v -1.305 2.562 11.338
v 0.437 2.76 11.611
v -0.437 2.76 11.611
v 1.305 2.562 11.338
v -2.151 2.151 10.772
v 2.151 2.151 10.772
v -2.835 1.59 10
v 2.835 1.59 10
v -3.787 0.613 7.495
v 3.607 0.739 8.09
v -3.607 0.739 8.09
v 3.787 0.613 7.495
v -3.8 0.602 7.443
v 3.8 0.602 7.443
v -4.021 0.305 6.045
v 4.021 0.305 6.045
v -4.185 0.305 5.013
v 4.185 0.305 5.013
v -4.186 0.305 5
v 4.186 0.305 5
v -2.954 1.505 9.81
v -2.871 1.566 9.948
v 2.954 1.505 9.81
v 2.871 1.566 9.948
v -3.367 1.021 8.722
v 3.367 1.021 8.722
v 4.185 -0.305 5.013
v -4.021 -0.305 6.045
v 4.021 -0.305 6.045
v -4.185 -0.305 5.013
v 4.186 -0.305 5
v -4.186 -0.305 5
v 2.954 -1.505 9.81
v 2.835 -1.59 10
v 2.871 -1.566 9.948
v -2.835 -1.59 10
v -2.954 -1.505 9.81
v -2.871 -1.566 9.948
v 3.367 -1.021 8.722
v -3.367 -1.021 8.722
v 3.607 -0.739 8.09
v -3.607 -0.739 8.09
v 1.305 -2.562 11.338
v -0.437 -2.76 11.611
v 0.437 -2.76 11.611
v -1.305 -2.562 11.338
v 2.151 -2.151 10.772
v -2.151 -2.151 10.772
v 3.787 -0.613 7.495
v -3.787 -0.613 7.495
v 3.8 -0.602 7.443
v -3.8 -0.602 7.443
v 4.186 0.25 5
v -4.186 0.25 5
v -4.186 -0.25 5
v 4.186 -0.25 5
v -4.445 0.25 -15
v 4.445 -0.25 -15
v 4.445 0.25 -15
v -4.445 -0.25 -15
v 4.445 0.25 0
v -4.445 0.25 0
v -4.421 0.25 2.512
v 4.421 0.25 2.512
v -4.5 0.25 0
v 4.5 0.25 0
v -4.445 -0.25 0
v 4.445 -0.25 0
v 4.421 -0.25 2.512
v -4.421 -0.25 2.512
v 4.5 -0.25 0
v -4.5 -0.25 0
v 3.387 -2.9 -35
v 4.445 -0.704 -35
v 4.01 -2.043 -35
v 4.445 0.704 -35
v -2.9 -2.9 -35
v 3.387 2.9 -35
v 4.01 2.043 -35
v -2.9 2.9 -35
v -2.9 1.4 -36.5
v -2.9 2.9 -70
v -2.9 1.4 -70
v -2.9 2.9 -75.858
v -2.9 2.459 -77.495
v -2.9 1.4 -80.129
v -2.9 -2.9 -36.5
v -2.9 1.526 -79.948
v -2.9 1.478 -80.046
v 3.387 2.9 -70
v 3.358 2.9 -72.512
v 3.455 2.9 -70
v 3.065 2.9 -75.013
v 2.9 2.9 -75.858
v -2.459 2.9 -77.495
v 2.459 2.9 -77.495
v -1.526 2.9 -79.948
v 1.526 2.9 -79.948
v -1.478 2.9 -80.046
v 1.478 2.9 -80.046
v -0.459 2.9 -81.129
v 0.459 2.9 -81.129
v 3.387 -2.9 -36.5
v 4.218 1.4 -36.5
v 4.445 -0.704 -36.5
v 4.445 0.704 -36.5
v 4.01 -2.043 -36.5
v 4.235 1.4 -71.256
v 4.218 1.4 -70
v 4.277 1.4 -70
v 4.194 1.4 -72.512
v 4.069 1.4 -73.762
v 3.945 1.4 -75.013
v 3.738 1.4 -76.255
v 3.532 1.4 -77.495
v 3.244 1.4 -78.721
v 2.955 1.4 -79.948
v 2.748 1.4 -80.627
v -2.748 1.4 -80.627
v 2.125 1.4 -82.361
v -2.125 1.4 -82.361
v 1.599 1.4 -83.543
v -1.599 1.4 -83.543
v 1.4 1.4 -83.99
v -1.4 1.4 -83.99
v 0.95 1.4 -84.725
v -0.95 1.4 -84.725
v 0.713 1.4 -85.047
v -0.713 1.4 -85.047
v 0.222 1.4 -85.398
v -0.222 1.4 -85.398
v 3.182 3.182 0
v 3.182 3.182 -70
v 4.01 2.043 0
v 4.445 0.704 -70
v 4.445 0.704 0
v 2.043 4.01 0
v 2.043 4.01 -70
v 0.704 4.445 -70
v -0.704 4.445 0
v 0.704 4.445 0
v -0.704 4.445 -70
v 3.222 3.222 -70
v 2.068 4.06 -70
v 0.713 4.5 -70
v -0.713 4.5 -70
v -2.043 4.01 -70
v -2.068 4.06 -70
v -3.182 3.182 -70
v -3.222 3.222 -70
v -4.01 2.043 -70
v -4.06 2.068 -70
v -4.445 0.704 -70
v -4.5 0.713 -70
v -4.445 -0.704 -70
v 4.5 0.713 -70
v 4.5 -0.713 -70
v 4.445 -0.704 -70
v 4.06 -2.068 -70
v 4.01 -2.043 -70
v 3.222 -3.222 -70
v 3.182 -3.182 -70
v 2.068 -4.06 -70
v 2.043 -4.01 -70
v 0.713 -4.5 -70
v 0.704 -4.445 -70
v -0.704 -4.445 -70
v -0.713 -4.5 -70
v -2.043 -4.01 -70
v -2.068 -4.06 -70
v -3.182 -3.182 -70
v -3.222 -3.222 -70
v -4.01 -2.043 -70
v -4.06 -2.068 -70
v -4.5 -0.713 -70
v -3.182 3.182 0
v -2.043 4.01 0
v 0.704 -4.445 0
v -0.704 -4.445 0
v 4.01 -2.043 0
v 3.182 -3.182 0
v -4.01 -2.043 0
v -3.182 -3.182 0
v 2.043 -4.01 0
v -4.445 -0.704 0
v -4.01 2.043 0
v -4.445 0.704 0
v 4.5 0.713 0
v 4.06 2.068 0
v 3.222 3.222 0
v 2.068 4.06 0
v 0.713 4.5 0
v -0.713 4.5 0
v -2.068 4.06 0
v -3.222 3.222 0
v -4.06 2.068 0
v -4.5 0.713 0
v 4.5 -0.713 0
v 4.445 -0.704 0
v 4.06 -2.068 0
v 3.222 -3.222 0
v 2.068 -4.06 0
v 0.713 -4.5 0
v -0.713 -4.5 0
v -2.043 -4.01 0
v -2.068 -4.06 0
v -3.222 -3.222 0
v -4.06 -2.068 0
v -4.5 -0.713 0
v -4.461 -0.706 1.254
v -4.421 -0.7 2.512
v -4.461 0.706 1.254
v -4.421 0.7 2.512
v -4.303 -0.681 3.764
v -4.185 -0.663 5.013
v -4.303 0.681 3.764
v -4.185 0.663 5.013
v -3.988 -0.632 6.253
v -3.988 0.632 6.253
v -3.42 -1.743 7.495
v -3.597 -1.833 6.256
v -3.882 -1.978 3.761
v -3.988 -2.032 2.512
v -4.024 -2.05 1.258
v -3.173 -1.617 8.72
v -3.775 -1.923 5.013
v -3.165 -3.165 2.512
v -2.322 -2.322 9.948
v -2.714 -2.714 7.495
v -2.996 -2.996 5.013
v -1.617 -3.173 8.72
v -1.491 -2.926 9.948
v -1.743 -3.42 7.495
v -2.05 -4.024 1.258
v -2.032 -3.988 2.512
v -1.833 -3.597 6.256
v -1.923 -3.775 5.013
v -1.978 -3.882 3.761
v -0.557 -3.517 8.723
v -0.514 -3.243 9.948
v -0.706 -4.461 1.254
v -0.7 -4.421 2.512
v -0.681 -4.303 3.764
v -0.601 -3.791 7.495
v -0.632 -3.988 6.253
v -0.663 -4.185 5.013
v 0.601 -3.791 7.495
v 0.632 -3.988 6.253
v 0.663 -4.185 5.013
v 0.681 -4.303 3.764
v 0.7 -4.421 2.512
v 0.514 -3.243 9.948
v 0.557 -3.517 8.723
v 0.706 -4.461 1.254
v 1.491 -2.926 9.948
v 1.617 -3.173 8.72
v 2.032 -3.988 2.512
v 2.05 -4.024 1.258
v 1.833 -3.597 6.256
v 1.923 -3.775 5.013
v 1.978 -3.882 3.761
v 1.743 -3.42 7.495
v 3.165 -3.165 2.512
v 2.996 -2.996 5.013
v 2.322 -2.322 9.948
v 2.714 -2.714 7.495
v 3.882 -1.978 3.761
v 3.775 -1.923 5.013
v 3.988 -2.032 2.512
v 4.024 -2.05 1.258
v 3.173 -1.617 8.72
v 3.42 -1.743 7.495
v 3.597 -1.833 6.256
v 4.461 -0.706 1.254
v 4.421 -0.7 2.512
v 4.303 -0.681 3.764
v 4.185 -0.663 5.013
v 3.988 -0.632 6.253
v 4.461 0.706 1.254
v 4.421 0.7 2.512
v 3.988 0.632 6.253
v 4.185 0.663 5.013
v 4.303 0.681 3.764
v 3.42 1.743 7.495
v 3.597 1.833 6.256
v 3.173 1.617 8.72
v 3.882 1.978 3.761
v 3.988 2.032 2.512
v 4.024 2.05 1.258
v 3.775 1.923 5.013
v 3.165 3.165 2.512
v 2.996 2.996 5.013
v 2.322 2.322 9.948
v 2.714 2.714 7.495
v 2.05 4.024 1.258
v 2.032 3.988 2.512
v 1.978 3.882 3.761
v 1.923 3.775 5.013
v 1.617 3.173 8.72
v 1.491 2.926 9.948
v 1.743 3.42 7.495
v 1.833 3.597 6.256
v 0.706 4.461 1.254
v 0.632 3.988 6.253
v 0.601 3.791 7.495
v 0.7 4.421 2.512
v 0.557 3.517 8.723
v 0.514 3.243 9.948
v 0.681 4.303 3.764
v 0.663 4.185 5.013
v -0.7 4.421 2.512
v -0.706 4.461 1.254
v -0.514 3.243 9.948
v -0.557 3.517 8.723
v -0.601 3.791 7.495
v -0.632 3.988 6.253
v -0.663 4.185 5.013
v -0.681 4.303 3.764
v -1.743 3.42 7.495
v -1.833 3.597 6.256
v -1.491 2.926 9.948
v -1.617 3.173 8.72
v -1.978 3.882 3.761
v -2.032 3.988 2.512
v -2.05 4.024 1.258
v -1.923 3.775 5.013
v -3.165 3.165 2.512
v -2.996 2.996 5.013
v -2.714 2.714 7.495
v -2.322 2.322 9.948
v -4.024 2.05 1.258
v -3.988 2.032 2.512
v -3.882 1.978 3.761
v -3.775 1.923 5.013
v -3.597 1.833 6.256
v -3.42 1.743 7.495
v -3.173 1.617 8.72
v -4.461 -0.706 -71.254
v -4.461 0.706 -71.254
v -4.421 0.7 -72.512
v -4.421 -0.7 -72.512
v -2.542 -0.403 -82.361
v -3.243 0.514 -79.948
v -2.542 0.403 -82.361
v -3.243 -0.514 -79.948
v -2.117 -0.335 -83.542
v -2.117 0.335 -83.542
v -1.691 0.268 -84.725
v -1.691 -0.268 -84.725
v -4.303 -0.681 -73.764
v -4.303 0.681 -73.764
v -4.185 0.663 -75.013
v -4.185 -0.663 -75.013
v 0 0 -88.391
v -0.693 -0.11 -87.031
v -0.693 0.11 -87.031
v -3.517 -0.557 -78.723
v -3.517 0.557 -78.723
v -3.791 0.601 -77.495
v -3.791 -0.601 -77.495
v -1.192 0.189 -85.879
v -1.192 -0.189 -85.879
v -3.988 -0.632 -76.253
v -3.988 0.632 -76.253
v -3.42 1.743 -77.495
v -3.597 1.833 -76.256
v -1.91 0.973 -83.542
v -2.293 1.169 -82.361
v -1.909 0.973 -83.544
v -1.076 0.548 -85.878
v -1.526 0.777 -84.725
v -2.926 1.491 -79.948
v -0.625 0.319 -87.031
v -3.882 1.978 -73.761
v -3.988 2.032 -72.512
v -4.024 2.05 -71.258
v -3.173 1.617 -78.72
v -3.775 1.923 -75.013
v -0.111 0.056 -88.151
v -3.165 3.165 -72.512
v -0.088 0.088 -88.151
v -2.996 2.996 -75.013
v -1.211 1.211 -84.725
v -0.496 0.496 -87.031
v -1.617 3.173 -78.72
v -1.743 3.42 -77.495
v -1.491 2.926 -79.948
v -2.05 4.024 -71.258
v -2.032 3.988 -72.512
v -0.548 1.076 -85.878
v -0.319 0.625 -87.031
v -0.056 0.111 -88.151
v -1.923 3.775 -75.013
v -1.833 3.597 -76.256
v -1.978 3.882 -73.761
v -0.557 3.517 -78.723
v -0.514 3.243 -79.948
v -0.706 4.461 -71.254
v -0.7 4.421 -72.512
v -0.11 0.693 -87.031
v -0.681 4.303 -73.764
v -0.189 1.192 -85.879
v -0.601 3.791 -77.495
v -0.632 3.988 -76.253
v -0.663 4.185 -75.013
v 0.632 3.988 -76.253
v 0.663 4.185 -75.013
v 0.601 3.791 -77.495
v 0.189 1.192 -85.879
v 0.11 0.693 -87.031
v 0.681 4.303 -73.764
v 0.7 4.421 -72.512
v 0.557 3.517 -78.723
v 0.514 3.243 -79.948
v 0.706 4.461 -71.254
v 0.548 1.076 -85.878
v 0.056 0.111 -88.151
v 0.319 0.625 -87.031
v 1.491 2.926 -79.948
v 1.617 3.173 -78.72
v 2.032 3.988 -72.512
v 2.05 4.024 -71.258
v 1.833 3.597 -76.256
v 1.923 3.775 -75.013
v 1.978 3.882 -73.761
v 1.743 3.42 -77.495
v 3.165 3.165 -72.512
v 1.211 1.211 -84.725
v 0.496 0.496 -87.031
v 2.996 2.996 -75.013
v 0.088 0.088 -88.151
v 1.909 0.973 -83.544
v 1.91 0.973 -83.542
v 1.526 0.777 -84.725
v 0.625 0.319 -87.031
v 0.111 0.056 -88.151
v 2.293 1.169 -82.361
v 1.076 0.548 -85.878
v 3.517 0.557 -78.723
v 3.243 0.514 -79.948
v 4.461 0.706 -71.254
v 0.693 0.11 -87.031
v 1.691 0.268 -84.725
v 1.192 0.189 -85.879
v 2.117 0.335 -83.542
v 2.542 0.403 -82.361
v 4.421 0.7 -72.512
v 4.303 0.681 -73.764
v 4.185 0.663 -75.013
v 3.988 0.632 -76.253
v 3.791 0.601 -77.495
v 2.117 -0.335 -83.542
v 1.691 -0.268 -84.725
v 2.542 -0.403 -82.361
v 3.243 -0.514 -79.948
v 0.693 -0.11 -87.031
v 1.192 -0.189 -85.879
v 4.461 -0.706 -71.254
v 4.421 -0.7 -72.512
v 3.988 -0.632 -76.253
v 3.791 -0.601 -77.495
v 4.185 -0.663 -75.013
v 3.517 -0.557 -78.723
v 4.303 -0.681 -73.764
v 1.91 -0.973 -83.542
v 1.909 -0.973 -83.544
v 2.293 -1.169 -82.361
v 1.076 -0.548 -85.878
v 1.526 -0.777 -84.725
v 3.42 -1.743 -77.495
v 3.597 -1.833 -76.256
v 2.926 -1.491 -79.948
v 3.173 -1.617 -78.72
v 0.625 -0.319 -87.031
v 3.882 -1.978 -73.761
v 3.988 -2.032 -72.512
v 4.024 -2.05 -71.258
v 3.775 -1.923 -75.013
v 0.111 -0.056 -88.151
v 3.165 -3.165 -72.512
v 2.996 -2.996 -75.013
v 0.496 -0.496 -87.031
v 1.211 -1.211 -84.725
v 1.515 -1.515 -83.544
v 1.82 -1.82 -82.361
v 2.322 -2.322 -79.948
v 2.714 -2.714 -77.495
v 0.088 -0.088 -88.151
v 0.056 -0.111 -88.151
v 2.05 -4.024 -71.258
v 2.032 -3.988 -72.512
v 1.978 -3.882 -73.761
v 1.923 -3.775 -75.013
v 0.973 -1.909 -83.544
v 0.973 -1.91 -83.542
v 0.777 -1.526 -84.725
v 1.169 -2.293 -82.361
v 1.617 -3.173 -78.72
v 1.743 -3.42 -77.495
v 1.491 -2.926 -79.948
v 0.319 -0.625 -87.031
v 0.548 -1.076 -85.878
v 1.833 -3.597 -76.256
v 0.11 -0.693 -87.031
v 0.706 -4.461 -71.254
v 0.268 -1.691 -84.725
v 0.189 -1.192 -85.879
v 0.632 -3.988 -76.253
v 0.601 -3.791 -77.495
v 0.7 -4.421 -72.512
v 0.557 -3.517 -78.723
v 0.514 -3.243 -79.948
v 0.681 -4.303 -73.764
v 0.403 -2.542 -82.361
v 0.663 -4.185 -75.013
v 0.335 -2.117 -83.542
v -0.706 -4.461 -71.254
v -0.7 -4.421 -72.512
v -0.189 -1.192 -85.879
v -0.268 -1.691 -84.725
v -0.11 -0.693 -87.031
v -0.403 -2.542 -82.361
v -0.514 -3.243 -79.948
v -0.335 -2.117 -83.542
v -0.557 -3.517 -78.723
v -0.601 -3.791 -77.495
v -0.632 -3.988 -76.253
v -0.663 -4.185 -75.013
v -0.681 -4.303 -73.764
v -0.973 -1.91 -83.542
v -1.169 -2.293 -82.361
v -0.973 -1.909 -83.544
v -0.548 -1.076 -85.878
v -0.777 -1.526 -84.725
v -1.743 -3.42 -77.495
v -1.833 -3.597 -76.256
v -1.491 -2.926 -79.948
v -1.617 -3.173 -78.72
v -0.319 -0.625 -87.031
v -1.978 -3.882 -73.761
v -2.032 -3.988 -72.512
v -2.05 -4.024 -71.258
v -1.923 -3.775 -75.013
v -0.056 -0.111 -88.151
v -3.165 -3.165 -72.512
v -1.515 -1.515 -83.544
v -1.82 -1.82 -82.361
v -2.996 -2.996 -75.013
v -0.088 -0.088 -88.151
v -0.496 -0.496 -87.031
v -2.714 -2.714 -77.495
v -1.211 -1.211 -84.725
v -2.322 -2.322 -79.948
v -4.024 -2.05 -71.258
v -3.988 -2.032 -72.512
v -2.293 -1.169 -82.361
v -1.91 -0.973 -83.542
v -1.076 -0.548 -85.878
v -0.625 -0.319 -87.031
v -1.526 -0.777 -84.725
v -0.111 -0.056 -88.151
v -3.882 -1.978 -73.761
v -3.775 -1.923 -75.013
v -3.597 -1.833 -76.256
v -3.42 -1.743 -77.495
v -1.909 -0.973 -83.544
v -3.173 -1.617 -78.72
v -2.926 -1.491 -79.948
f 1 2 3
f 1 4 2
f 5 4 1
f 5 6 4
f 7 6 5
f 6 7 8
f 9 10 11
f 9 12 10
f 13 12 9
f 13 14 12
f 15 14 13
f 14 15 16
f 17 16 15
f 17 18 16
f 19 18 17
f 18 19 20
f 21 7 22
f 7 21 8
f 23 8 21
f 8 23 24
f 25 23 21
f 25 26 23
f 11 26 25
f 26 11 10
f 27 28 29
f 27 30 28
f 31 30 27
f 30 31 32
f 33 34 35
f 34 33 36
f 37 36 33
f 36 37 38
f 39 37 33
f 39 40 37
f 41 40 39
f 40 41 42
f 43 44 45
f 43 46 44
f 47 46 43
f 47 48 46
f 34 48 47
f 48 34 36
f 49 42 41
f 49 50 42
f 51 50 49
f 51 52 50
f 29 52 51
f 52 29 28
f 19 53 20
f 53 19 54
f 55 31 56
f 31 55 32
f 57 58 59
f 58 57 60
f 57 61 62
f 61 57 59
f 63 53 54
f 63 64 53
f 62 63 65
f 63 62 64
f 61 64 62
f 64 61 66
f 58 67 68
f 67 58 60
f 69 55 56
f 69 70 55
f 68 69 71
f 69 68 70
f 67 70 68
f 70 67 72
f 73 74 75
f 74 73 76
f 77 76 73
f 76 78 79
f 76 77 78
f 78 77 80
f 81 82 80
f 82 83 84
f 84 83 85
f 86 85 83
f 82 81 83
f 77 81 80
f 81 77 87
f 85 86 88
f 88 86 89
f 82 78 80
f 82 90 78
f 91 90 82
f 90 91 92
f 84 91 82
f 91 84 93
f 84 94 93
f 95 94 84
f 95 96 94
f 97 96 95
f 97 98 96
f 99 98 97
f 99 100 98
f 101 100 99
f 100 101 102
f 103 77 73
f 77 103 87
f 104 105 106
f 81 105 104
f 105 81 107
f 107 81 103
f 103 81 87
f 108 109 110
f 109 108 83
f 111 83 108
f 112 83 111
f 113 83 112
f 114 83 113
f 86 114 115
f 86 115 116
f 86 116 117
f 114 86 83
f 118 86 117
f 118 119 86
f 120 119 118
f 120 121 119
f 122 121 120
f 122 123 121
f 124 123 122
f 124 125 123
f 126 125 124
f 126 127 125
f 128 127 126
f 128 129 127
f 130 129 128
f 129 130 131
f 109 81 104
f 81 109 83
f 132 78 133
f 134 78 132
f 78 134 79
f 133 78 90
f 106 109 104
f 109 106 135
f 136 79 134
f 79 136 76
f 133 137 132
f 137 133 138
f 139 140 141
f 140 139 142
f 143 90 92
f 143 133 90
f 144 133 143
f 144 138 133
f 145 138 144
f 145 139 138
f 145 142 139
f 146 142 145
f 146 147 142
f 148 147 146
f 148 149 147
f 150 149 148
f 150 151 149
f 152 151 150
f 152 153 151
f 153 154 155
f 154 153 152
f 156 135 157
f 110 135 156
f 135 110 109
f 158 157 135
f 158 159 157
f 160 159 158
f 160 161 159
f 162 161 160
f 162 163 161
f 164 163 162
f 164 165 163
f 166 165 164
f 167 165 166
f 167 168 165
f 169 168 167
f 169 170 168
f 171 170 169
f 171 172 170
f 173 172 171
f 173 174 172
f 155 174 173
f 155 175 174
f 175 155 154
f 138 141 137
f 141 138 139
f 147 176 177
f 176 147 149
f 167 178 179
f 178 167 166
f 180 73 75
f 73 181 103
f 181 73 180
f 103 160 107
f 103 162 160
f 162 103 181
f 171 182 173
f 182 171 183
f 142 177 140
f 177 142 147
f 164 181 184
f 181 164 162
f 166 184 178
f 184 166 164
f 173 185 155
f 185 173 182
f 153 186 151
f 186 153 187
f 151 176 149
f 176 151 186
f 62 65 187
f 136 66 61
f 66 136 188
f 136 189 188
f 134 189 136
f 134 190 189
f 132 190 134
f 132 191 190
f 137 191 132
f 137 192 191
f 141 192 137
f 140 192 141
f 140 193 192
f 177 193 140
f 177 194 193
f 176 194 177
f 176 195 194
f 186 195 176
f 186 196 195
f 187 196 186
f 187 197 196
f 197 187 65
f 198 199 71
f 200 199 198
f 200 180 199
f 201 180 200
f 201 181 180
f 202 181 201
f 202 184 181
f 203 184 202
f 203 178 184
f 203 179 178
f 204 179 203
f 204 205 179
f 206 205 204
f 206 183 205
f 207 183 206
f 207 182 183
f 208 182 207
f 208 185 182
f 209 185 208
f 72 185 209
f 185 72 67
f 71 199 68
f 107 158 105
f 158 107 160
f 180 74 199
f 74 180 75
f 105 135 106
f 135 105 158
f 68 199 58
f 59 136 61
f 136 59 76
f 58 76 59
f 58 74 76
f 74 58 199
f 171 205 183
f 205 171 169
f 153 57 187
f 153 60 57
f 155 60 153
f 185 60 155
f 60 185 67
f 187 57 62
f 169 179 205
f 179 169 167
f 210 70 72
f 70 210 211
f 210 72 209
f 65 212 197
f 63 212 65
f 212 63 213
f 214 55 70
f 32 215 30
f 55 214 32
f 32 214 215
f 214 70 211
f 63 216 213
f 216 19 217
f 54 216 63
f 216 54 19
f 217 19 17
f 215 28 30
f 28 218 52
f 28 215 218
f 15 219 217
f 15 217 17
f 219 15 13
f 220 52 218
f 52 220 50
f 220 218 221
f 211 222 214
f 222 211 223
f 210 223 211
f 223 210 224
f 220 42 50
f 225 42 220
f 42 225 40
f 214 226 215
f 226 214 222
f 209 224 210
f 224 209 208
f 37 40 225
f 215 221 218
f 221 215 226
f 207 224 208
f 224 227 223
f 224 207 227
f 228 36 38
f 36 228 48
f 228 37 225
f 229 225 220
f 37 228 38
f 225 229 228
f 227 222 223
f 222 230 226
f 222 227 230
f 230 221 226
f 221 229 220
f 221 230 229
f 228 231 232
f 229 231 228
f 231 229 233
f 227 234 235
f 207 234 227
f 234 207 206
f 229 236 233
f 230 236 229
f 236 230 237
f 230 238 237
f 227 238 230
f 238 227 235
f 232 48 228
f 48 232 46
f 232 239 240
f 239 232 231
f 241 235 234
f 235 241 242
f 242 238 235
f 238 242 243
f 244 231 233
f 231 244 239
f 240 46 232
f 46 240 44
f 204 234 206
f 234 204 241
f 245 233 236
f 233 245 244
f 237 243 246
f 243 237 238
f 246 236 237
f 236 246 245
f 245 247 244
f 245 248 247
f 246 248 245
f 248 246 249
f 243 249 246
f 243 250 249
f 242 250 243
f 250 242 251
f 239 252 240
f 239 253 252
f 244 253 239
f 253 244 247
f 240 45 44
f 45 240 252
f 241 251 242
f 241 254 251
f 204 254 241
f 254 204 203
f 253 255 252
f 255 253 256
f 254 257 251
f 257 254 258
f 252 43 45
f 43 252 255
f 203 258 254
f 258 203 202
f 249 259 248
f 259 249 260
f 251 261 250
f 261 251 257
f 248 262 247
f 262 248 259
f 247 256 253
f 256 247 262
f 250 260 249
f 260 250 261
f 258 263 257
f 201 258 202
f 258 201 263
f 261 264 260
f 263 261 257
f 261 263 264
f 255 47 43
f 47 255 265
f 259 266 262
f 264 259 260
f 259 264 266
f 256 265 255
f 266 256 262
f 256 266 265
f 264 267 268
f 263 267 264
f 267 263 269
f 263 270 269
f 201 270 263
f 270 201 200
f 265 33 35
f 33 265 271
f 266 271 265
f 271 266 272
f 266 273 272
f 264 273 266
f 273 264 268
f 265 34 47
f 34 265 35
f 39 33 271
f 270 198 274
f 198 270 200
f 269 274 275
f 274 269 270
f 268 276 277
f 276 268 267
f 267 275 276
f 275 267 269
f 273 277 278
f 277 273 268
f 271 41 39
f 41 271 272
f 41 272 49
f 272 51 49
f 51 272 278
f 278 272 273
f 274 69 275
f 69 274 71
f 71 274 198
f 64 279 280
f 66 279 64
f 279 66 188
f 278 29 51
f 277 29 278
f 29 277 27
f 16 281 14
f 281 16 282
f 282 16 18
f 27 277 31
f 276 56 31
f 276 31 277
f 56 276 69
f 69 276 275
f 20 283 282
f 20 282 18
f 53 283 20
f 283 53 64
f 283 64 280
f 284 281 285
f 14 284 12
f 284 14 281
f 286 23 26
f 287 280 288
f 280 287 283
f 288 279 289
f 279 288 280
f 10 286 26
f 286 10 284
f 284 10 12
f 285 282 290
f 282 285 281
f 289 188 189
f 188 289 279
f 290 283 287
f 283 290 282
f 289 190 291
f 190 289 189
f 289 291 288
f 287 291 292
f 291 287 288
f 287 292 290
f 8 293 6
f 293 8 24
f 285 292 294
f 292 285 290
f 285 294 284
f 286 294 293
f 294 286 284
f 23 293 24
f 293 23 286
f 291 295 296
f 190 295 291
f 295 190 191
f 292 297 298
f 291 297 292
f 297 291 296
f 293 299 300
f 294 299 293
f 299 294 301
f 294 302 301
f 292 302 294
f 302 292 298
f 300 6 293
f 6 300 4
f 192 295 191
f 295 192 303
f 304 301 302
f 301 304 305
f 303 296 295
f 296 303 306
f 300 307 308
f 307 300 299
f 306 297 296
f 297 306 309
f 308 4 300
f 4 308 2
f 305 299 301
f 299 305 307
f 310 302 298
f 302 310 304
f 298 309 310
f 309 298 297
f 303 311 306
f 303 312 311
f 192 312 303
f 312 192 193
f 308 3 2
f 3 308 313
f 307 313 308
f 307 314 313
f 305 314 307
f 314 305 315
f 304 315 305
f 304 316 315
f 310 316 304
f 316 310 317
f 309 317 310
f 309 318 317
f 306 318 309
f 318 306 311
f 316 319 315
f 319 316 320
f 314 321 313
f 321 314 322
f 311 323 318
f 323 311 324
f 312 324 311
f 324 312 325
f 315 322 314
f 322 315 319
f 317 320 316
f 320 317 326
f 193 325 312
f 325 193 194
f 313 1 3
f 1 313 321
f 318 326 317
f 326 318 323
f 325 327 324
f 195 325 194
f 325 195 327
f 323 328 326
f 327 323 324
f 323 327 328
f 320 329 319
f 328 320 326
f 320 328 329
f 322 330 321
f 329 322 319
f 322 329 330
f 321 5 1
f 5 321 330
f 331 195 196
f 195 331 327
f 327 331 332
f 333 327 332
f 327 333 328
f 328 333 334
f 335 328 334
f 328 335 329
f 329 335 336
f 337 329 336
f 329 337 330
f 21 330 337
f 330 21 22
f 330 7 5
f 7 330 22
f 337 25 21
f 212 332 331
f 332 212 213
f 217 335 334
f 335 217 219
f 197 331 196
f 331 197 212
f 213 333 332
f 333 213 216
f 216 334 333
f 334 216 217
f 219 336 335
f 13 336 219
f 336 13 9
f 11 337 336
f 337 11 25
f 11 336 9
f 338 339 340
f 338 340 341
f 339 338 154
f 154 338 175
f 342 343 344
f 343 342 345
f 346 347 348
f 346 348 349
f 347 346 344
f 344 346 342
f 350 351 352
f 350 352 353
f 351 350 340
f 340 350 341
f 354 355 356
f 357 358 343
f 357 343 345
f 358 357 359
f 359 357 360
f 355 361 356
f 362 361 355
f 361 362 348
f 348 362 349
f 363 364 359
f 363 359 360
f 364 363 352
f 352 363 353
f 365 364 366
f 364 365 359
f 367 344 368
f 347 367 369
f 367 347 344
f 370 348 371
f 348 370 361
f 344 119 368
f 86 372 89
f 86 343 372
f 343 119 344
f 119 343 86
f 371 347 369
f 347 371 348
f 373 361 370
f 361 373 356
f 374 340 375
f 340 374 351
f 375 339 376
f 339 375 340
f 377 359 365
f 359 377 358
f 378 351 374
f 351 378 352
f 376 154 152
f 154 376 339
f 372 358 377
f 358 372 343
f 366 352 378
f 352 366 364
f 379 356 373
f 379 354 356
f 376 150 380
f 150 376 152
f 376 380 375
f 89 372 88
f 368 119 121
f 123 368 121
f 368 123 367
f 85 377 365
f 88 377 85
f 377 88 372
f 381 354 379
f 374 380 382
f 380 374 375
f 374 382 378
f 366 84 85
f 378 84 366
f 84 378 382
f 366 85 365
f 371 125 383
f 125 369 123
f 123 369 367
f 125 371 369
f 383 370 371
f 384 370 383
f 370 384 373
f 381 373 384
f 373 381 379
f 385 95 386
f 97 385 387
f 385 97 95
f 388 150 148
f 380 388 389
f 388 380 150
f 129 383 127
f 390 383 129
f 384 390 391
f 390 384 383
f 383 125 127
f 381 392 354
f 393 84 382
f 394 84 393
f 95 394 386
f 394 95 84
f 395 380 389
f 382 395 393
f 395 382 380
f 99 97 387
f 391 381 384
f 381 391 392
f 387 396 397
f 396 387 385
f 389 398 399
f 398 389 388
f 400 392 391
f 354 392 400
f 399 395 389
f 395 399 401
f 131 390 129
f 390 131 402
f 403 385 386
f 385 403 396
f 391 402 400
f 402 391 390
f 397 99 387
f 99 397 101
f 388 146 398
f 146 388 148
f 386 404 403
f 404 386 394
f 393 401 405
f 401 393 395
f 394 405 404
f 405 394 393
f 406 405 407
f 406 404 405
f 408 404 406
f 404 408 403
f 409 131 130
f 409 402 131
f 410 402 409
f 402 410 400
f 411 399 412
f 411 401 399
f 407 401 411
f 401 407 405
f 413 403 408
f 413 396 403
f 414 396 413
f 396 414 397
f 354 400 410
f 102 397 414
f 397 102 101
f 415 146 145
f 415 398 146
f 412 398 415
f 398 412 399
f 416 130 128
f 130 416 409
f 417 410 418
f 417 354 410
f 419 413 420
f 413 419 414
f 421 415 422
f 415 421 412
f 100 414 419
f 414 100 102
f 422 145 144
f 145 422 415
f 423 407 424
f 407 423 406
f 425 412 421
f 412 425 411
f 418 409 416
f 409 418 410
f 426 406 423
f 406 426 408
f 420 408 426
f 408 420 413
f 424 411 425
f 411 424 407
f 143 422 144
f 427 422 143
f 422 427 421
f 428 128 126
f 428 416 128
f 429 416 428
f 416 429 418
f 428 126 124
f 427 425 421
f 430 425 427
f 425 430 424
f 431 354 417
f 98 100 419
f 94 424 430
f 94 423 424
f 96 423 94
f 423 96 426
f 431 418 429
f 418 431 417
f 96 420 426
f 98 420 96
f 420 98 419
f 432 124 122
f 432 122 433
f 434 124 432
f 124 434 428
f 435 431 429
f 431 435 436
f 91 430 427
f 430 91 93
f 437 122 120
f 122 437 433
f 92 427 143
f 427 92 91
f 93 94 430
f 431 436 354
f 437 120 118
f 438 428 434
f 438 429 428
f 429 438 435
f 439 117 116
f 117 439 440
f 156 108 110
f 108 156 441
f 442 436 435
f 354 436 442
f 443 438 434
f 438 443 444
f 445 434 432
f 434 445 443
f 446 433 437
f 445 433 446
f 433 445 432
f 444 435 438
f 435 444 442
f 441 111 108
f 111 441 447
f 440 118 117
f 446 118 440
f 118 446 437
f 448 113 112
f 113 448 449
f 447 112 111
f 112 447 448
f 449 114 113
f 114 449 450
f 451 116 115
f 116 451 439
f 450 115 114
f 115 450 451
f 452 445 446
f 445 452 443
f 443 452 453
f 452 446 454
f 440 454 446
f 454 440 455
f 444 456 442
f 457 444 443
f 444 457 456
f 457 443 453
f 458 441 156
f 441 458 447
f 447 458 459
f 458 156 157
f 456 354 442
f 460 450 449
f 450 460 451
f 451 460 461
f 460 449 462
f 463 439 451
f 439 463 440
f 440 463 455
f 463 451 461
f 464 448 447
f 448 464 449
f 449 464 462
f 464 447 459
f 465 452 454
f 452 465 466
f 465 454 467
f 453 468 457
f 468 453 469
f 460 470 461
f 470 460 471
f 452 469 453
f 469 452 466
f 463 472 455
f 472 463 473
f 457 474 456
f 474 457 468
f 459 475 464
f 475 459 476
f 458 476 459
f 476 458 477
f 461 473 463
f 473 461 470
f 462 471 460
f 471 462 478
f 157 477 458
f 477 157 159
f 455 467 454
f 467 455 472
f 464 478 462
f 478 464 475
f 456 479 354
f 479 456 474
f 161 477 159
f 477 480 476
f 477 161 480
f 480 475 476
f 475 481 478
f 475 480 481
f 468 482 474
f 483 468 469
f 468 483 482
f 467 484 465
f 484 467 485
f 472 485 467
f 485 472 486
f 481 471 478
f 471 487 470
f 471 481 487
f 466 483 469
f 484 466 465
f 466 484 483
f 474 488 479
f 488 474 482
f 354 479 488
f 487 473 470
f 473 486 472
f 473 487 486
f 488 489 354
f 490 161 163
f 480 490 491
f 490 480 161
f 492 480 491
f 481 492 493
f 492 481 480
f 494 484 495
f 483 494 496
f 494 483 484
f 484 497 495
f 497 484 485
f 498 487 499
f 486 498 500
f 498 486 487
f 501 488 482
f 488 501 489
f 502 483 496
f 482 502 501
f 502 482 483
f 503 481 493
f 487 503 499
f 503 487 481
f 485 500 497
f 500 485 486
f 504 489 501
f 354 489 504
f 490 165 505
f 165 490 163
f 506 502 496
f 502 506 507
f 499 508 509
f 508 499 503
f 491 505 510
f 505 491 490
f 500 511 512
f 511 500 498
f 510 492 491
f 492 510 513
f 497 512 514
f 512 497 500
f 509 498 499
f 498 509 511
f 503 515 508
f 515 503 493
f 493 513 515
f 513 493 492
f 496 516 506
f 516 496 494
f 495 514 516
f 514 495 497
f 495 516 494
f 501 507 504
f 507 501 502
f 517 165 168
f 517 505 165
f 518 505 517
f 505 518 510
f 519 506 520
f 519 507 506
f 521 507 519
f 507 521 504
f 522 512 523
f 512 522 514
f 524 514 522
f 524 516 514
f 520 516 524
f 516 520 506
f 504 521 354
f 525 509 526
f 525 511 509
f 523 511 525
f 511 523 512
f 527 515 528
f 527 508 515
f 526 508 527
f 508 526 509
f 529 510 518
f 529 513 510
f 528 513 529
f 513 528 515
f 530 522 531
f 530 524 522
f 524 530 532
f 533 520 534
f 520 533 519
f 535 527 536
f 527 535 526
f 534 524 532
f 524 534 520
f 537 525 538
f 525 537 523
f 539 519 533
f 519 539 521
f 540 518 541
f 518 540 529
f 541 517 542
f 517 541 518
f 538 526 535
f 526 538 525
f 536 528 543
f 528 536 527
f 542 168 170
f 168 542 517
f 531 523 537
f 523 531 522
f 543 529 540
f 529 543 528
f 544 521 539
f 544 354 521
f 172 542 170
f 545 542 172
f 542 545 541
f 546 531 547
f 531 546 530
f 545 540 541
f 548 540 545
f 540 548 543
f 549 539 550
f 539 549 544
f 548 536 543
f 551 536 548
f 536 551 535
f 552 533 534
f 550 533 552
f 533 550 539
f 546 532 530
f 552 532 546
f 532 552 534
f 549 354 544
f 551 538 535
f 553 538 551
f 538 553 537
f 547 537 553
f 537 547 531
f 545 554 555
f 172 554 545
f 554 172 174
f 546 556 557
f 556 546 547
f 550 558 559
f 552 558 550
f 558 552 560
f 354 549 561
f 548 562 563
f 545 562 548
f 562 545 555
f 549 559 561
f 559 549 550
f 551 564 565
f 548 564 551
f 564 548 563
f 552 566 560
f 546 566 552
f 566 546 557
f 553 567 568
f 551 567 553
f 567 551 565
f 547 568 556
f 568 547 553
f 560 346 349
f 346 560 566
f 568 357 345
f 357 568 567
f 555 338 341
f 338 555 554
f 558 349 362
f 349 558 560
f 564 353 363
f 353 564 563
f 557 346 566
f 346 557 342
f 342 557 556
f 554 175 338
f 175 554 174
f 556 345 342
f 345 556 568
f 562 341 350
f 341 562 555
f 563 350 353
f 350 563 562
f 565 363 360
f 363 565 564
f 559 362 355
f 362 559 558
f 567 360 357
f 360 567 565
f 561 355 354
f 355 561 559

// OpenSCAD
shaft_radius = 4.5;
shaft_height = 70;

module nose() {
    rot_max = 20;
    rot_angle = 360/rot_max;
    curve_radius = 40;
    difference() {
        intersection_for (i = [0:rot_max]) {
            rotate(i*rot_angle, [0,0,1])
            translate([curve_radius - shaft_radius ,0,0])
            rotate(90, [1,0,0])
            cylinder(1000, r = curve_radius, center = true, $fn = 100);
        }
        translate([0,0,-2*shaft_radius])
        cube(4*shaft_radius, center = true);
    }
}

module tail() {
    translate([0,0,-shaft_height])
    rotate(180, [1,0,0])
    nose();
}

module shaft() {
    rotate(360/40, [0,0,1])
    translate([0,0,-shaft_height/2])
    cylinder(shaft_height, r = shaft_radius, center = true, $fn = 20);
}

module hook_notches() {
    hook_thickness = 2;
    
    translate([hook_thickness/2,0,0])
    cube([20,20,20]);
    
    translate([-20-hook_thickness/2,0,0])
    cube([20,20,20]);
    
    translate([0,shaft_radius,hook_thickness/2 - 1])
    cube([4*hook_thickness, 2*shaft_radius, 2+hook_thickness], center = true);
}

module hook_cross_hole_1() {
    curve_radius = 20;
    hook_thickness = 1;
    
    intersection() {
        translate([0,shaft_radius,15])
        cube([4*shaft_radius, 2*shaft_radius, 30], center = true);
        
        translate([0,-curve_radius+shaft_radius-hook_thickness,0])
        rotate(90, [0,1,0])
        cylinder(20, r = curve_radius, center = true, $fn = 50);
    }
}

module hook_cross_hole_2() {
    radius = 5;
    
    union() {
        intersection() {
            translate([0,10,-10])
            cube(20, center = true);
        
            translate([0,radius,0])
            rotate(90, [0,1,0])
            cylinder(30, r = radius, center = true, $fn = 50);
        }
        difference() {
            translate([0,10+radius*cos(60),10-2*radius*sin(60)])
            cube(20, center = true);
            
            translate([0,0,-2*radius*sin(60)])
            rotate(90, [0,1,0])
            cylinder(30, r = radius, center = true, $fn = 50);
        }
    }
}

module tape_measure_slot() {
    head_vertical = 1.5;
    head_horizontal = 1.5;
    head_height = 5.8;
    tape_width = 5.8;
    
    translate([shaft_radius-tape_width/2,0,-shaft_height/2-5-shaft_height/2])
    difference() {
        cube([2*shaft_radius,head_height,shaft_height+10], center = true);
        
        translate([0,-head_vertical, -head_horizontal])
        cube([4*shaft_radius,head_height,shaft_height+10], center = true);
    }
}

module grip_slot() {
    thickness = 0.5;
    
    translate([0,0,5]) {
        difference() {
            cube([10,10,40], center = true);
            
            translate([0,10 + thickness/2,0])
            rotate([0,90,0])
            cylinder(r = 10, h = 20, center = true);
            
            translate([0,-(10 + thickness/2),0])
            rotate([0,90,0])
            cylinder(r = 10, h = 20, center = true);
        
            translate([0,0,-20])
            cube([20,20,40], center = true);
        }
        
        translate([0,0,-10])
        cube([10,thickness,20], center = true);
    }
}


difference() {
    shaft();
    grip_slot();
    //translate([0,0,0.1]) hook_cross_hole_2();
    tape_measure_slot();
}

difference() {
    nose();
    grip_slot();
    //hook_notches();
    //translate([0,0,-0.1]) hook_cross_hole_1();
}

difference(){
    tail();
    tape_measure_slot();
}
